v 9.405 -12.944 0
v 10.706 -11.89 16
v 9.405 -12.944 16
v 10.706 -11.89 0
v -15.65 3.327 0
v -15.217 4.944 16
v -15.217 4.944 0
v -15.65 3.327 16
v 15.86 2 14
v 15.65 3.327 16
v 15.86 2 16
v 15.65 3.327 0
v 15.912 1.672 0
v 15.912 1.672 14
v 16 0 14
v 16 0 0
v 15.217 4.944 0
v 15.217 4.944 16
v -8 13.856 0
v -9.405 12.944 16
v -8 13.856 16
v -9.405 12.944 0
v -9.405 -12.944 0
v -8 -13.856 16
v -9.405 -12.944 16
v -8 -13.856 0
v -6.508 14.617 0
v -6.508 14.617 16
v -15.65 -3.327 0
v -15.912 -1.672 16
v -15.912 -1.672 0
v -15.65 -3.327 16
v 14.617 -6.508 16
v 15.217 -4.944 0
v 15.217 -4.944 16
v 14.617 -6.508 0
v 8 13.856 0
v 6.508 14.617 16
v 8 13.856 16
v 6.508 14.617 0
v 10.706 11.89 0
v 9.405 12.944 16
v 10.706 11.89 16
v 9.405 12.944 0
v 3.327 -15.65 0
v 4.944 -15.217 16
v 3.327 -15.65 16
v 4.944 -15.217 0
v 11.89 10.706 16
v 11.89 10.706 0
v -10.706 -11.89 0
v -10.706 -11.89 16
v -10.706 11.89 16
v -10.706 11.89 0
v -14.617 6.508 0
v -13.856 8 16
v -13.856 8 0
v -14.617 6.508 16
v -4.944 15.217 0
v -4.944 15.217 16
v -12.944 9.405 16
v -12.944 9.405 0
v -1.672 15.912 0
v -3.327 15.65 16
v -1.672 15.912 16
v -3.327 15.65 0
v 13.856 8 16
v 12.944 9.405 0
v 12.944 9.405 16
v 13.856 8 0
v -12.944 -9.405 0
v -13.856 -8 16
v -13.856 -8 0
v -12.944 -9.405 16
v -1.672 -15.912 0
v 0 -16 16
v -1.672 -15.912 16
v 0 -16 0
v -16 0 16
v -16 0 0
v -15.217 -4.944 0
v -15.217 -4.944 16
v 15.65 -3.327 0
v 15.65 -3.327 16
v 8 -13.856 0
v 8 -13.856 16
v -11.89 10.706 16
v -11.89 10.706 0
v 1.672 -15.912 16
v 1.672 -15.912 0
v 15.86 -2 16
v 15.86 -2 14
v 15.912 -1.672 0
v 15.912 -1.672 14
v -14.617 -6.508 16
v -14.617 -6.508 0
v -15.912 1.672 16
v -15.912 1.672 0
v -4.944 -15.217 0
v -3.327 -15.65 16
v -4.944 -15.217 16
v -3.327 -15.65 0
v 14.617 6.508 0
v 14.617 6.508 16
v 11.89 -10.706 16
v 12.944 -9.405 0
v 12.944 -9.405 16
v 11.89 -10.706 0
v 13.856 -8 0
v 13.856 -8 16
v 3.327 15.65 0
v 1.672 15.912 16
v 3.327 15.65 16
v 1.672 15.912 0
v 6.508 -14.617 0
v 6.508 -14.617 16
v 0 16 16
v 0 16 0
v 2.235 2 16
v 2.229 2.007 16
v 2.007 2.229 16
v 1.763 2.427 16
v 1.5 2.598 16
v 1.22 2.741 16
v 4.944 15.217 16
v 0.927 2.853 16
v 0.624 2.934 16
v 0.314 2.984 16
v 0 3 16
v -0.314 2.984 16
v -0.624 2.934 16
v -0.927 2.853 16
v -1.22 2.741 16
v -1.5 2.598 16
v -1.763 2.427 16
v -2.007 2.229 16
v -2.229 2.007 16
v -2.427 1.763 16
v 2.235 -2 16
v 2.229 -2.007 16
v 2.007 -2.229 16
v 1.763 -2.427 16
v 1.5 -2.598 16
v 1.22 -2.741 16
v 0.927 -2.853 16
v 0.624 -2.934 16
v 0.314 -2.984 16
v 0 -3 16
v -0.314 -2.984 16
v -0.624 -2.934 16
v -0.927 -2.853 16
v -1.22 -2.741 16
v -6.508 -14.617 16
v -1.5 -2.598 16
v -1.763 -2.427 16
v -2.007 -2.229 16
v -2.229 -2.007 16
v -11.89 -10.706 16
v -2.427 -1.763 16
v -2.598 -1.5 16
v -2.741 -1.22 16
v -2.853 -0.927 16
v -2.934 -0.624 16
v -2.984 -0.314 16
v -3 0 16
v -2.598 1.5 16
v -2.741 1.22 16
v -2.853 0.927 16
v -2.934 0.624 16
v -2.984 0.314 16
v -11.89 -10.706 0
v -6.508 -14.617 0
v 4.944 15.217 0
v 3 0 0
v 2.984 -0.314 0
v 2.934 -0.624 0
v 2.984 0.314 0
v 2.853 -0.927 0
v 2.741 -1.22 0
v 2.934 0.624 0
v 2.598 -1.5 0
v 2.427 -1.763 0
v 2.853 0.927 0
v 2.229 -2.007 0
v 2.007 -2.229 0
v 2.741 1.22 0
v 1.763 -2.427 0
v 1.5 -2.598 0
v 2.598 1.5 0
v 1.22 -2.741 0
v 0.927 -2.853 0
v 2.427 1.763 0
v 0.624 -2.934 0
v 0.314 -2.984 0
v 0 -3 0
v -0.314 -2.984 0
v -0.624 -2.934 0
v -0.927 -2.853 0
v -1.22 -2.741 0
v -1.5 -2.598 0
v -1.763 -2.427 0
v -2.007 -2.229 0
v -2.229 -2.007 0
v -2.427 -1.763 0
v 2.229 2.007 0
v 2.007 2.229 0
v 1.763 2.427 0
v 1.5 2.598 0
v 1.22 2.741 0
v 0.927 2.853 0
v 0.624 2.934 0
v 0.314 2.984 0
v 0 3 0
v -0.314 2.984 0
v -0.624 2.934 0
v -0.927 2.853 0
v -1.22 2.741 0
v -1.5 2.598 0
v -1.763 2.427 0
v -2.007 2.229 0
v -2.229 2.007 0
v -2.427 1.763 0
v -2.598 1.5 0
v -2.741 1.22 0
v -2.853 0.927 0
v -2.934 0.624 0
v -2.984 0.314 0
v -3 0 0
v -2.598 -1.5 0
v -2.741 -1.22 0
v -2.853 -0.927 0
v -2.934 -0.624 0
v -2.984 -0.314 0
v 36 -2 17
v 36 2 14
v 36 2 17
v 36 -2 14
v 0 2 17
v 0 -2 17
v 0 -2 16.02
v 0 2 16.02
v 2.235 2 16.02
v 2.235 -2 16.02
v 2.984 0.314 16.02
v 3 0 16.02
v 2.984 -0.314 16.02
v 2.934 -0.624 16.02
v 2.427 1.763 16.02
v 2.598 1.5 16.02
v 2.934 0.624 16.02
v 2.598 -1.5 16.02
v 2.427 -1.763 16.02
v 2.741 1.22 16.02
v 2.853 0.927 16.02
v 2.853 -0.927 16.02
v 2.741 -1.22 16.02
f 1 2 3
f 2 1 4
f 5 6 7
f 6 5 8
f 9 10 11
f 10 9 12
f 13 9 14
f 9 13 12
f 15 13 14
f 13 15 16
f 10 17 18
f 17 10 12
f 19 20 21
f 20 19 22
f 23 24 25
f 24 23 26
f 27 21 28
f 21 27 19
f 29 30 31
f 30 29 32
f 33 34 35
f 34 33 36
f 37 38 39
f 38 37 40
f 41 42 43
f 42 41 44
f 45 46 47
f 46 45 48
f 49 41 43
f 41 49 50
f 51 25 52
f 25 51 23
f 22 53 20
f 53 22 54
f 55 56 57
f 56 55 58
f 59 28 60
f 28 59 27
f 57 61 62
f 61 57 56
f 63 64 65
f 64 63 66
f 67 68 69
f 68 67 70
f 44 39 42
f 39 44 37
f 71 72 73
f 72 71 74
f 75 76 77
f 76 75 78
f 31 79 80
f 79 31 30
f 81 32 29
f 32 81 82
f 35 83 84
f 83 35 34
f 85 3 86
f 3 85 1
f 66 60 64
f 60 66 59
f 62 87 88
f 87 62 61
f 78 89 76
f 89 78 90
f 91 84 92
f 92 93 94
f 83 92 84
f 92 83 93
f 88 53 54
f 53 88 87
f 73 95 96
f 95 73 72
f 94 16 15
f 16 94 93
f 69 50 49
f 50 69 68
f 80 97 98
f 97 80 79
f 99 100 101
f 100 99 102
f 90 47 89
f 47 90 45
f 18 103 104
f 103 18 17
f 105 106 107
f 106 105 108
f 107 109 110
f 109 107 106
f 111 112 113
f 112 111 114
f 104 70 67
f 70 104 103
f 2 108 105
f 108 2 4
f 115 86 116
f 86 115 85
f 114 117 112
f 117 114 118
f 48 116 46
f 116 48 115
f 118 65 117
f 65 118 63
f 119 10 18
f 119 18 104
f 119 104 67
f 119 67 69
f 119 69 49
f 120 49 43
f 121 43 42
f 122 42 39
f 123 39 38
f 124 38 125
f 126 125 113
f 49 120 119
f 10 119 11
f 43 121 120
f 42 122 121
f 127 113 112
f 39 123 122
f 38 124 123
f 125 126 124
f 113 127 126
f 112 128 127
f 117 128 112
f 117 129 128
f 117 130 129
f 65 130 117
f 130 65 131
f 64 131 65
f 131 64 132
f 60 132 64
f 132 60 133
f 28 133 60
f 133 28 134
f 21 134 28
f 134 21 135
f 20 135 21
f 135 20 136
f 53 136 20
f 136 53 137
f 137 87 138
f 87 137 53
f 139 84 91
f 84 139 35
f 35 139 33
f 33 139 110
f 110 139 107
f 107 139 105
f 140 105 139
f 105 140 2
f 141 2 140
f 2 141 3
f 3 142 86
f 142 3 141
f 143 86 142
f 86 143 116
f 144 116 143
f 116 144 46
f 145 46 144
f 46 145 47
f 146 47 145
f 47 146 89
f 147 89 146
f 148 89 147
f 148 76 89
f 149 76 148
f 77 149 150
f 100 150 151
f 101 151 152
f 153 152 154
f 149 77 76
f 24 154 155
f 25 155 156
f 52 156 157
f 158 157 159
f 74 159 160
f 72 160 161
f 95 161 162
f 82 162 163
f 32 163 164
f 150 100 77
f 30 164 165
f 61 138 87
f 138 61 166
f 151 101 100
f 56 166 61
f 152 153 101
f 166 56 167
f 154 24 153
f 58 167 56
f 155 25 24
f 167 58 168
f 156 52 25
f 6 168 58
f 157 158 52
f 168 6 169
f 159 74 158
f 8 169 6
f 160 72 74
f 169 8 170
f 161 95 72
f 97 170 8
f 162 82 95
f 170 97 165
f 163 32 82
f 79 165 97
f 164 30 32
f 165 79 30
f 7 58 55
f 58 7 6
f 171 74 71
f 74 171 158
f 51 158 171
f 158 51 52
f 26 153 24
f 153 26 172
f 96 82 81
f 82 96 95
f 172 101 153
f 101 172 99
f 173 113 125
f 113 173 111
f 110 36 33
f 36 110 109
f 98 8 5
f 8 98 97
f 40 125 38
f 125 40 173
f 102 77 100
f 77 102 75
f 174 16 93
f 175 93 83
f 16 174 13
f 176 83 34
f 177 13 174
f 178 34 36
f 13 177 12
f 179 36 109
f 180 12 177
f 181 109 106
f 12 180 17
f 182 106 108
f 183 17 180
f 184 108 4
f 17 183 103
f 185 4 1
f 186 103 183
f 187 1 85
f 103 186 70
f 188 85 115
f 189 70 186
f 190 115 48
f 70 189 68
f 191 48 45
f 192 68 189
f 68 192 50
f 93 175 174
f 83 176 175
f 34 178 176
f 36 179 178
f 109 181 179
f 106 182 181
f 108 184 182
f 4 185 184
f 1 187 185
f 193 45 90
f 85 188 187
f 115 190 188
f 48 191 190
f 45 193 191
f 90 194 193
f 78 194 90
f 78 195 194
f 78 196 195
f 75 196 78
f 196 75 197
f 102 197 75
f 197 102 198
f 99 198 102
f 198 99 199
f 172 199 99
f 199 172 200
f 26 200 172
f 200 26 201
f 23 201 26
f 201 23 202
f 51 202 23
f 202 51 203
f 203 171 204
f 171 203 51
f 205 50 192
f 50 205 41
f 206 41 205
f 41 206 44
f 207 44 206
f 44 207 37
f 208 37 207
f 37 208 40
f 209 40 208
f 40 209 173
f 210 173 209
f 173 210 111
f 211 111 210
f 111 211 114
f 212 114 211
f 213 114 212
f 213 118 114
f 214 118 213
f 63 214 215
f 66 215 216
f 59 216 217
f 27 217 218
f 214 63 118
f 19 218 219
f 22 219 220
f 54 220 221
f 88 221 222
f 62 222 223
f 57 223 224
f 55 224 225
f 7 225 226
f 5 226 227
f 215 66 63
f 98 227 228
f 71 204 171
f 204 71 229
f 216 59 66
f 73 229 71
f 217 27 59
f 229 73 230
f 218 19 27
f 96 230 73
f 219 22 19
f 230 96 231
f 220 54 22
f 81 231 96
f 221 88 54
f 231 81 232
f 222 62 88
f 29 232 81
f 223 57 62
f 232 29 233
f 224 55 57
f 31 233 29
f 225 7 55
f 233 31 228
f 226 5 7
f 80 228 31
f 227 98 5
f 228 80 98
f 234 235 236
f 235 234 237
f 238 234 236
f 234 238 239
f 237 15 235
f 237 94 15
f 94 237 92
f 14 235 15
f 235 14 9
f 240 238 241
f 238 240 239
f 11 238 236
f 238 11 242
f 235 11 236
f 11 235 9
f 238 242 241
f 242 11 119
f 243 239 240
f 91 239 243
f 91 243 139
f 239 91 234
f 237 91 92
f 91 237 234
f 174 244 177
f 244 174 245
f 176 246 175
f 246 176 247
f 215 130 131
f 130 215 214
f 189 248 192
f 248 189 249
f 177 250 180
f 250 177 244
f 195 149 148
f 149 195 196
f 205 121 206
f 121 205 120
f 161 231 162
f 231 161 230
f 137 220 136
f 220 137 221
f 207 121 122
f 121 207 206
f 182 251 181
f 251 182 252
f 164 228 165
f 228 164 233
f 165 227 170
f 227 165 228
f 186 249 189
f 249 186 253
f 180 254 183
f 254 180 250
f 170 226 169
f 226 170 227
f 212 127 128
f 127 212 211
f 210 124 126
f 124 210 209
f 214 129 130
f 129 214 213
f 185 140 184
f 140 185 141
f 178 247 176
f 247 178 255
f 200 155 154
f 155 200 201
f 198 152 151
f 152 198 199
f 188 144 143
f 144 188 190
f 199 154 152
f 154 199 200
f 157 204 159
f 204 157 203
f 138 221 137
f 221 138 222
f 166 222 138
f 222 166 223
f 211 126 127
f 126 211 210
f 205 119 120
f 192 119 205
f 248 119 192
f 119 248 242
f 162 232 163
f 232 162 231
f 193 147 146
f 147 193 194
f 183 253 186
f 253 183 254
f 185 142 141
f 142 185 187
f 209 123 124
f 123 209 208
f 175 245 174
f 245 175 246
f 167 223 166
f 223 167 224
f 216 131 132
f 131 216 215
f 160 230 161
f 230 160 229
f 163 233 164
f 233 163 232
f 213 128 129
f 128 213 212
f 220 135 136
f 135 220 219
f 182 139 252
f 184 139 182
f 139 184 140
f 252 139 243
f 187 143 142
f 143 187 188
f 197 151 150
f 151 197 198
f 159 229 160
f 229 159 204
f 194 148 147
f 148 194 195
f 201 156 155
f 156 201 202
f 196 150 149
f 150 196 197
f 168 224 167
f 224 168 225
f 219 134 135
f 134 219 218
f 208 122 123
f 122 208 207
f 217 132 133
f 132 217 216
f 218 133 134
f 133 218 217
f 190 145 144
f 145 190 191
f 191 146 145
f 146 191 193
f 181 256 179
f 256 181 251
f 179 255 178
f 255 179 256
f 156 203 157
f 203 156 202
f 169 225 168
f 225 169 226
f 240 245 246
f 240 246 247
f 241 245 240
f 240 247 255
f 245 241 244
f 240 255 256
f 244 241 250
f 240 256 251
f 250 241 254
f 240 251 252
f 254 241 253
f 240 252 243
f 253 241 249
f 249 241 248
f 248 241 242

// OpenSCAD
// Quarter-turn cam lock.
$fn = 60;
eps = 0.02;
body_d = 32;
body_l = 16;
arm_l = 36;
difference() { union() { cylinder(d=body_d,h=body_l); translate([0,-2,body_l-2]) cube([arm_l,4,3]); } translate([0,0,-eps]) cylinder(d=6,h=body_l+2*eps); }
